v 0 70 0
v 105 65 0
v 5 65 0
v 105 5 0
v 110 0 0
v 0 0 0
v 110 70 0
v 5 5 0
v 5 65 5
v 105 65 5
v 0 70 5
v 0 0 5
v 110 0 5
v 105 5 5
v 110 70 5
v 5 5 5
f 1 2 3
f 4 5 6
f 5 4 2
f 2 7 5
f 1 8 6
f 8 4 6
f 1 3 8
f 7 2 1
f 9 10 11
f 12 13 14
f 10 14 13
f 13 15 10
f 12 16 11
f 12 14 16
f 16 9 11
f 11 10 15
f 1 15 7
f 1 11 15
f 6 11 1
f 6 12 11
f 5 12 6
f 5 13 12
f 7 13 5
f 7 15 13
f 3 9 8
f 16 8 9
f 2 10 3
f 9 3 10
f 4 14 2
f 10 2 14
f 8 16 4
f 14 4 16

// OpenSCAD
// file: pipe.scad
// Function to create a rectangular frame with Z-height
module rectangular_frame(outer_width, outer_height, frame_width, z_height) {
    // Calculate inner dimensions
    inner_width = outer_width - 2 * frame_width;
    inner_height = outer_height - 2 * frame_width;

    // Extrude the 2D frame into 3D
    linear_extrude(height = z_height) {
        difference() {
            square([outer_width, outer_height]);
            translate([frame_width, frame_width])
                square([inner_width, inner_height]);
        }
    }
}

// Example usage
//rectangular_frame(100, 60, 3, 10); // 100x60mm outer size, 3mm frame width, 5mm Z-height
// main file
// Include the rectangular_frame module
include <pipe.scad>;

// Define the hole size
hole_width = 100;
hole_height = 60;
frame_width = 5; // Thickness of the rectangle around the hole

// Calculate outer dimensions
outer_width = hole_width + 2 * frame_width;
outer_height = hole_height + 2 * frame_width;

// Render the rectangle with a hole
rectangular_frame(outer_width, outer_height, frame_width, 5); // Z-height = 5mm
